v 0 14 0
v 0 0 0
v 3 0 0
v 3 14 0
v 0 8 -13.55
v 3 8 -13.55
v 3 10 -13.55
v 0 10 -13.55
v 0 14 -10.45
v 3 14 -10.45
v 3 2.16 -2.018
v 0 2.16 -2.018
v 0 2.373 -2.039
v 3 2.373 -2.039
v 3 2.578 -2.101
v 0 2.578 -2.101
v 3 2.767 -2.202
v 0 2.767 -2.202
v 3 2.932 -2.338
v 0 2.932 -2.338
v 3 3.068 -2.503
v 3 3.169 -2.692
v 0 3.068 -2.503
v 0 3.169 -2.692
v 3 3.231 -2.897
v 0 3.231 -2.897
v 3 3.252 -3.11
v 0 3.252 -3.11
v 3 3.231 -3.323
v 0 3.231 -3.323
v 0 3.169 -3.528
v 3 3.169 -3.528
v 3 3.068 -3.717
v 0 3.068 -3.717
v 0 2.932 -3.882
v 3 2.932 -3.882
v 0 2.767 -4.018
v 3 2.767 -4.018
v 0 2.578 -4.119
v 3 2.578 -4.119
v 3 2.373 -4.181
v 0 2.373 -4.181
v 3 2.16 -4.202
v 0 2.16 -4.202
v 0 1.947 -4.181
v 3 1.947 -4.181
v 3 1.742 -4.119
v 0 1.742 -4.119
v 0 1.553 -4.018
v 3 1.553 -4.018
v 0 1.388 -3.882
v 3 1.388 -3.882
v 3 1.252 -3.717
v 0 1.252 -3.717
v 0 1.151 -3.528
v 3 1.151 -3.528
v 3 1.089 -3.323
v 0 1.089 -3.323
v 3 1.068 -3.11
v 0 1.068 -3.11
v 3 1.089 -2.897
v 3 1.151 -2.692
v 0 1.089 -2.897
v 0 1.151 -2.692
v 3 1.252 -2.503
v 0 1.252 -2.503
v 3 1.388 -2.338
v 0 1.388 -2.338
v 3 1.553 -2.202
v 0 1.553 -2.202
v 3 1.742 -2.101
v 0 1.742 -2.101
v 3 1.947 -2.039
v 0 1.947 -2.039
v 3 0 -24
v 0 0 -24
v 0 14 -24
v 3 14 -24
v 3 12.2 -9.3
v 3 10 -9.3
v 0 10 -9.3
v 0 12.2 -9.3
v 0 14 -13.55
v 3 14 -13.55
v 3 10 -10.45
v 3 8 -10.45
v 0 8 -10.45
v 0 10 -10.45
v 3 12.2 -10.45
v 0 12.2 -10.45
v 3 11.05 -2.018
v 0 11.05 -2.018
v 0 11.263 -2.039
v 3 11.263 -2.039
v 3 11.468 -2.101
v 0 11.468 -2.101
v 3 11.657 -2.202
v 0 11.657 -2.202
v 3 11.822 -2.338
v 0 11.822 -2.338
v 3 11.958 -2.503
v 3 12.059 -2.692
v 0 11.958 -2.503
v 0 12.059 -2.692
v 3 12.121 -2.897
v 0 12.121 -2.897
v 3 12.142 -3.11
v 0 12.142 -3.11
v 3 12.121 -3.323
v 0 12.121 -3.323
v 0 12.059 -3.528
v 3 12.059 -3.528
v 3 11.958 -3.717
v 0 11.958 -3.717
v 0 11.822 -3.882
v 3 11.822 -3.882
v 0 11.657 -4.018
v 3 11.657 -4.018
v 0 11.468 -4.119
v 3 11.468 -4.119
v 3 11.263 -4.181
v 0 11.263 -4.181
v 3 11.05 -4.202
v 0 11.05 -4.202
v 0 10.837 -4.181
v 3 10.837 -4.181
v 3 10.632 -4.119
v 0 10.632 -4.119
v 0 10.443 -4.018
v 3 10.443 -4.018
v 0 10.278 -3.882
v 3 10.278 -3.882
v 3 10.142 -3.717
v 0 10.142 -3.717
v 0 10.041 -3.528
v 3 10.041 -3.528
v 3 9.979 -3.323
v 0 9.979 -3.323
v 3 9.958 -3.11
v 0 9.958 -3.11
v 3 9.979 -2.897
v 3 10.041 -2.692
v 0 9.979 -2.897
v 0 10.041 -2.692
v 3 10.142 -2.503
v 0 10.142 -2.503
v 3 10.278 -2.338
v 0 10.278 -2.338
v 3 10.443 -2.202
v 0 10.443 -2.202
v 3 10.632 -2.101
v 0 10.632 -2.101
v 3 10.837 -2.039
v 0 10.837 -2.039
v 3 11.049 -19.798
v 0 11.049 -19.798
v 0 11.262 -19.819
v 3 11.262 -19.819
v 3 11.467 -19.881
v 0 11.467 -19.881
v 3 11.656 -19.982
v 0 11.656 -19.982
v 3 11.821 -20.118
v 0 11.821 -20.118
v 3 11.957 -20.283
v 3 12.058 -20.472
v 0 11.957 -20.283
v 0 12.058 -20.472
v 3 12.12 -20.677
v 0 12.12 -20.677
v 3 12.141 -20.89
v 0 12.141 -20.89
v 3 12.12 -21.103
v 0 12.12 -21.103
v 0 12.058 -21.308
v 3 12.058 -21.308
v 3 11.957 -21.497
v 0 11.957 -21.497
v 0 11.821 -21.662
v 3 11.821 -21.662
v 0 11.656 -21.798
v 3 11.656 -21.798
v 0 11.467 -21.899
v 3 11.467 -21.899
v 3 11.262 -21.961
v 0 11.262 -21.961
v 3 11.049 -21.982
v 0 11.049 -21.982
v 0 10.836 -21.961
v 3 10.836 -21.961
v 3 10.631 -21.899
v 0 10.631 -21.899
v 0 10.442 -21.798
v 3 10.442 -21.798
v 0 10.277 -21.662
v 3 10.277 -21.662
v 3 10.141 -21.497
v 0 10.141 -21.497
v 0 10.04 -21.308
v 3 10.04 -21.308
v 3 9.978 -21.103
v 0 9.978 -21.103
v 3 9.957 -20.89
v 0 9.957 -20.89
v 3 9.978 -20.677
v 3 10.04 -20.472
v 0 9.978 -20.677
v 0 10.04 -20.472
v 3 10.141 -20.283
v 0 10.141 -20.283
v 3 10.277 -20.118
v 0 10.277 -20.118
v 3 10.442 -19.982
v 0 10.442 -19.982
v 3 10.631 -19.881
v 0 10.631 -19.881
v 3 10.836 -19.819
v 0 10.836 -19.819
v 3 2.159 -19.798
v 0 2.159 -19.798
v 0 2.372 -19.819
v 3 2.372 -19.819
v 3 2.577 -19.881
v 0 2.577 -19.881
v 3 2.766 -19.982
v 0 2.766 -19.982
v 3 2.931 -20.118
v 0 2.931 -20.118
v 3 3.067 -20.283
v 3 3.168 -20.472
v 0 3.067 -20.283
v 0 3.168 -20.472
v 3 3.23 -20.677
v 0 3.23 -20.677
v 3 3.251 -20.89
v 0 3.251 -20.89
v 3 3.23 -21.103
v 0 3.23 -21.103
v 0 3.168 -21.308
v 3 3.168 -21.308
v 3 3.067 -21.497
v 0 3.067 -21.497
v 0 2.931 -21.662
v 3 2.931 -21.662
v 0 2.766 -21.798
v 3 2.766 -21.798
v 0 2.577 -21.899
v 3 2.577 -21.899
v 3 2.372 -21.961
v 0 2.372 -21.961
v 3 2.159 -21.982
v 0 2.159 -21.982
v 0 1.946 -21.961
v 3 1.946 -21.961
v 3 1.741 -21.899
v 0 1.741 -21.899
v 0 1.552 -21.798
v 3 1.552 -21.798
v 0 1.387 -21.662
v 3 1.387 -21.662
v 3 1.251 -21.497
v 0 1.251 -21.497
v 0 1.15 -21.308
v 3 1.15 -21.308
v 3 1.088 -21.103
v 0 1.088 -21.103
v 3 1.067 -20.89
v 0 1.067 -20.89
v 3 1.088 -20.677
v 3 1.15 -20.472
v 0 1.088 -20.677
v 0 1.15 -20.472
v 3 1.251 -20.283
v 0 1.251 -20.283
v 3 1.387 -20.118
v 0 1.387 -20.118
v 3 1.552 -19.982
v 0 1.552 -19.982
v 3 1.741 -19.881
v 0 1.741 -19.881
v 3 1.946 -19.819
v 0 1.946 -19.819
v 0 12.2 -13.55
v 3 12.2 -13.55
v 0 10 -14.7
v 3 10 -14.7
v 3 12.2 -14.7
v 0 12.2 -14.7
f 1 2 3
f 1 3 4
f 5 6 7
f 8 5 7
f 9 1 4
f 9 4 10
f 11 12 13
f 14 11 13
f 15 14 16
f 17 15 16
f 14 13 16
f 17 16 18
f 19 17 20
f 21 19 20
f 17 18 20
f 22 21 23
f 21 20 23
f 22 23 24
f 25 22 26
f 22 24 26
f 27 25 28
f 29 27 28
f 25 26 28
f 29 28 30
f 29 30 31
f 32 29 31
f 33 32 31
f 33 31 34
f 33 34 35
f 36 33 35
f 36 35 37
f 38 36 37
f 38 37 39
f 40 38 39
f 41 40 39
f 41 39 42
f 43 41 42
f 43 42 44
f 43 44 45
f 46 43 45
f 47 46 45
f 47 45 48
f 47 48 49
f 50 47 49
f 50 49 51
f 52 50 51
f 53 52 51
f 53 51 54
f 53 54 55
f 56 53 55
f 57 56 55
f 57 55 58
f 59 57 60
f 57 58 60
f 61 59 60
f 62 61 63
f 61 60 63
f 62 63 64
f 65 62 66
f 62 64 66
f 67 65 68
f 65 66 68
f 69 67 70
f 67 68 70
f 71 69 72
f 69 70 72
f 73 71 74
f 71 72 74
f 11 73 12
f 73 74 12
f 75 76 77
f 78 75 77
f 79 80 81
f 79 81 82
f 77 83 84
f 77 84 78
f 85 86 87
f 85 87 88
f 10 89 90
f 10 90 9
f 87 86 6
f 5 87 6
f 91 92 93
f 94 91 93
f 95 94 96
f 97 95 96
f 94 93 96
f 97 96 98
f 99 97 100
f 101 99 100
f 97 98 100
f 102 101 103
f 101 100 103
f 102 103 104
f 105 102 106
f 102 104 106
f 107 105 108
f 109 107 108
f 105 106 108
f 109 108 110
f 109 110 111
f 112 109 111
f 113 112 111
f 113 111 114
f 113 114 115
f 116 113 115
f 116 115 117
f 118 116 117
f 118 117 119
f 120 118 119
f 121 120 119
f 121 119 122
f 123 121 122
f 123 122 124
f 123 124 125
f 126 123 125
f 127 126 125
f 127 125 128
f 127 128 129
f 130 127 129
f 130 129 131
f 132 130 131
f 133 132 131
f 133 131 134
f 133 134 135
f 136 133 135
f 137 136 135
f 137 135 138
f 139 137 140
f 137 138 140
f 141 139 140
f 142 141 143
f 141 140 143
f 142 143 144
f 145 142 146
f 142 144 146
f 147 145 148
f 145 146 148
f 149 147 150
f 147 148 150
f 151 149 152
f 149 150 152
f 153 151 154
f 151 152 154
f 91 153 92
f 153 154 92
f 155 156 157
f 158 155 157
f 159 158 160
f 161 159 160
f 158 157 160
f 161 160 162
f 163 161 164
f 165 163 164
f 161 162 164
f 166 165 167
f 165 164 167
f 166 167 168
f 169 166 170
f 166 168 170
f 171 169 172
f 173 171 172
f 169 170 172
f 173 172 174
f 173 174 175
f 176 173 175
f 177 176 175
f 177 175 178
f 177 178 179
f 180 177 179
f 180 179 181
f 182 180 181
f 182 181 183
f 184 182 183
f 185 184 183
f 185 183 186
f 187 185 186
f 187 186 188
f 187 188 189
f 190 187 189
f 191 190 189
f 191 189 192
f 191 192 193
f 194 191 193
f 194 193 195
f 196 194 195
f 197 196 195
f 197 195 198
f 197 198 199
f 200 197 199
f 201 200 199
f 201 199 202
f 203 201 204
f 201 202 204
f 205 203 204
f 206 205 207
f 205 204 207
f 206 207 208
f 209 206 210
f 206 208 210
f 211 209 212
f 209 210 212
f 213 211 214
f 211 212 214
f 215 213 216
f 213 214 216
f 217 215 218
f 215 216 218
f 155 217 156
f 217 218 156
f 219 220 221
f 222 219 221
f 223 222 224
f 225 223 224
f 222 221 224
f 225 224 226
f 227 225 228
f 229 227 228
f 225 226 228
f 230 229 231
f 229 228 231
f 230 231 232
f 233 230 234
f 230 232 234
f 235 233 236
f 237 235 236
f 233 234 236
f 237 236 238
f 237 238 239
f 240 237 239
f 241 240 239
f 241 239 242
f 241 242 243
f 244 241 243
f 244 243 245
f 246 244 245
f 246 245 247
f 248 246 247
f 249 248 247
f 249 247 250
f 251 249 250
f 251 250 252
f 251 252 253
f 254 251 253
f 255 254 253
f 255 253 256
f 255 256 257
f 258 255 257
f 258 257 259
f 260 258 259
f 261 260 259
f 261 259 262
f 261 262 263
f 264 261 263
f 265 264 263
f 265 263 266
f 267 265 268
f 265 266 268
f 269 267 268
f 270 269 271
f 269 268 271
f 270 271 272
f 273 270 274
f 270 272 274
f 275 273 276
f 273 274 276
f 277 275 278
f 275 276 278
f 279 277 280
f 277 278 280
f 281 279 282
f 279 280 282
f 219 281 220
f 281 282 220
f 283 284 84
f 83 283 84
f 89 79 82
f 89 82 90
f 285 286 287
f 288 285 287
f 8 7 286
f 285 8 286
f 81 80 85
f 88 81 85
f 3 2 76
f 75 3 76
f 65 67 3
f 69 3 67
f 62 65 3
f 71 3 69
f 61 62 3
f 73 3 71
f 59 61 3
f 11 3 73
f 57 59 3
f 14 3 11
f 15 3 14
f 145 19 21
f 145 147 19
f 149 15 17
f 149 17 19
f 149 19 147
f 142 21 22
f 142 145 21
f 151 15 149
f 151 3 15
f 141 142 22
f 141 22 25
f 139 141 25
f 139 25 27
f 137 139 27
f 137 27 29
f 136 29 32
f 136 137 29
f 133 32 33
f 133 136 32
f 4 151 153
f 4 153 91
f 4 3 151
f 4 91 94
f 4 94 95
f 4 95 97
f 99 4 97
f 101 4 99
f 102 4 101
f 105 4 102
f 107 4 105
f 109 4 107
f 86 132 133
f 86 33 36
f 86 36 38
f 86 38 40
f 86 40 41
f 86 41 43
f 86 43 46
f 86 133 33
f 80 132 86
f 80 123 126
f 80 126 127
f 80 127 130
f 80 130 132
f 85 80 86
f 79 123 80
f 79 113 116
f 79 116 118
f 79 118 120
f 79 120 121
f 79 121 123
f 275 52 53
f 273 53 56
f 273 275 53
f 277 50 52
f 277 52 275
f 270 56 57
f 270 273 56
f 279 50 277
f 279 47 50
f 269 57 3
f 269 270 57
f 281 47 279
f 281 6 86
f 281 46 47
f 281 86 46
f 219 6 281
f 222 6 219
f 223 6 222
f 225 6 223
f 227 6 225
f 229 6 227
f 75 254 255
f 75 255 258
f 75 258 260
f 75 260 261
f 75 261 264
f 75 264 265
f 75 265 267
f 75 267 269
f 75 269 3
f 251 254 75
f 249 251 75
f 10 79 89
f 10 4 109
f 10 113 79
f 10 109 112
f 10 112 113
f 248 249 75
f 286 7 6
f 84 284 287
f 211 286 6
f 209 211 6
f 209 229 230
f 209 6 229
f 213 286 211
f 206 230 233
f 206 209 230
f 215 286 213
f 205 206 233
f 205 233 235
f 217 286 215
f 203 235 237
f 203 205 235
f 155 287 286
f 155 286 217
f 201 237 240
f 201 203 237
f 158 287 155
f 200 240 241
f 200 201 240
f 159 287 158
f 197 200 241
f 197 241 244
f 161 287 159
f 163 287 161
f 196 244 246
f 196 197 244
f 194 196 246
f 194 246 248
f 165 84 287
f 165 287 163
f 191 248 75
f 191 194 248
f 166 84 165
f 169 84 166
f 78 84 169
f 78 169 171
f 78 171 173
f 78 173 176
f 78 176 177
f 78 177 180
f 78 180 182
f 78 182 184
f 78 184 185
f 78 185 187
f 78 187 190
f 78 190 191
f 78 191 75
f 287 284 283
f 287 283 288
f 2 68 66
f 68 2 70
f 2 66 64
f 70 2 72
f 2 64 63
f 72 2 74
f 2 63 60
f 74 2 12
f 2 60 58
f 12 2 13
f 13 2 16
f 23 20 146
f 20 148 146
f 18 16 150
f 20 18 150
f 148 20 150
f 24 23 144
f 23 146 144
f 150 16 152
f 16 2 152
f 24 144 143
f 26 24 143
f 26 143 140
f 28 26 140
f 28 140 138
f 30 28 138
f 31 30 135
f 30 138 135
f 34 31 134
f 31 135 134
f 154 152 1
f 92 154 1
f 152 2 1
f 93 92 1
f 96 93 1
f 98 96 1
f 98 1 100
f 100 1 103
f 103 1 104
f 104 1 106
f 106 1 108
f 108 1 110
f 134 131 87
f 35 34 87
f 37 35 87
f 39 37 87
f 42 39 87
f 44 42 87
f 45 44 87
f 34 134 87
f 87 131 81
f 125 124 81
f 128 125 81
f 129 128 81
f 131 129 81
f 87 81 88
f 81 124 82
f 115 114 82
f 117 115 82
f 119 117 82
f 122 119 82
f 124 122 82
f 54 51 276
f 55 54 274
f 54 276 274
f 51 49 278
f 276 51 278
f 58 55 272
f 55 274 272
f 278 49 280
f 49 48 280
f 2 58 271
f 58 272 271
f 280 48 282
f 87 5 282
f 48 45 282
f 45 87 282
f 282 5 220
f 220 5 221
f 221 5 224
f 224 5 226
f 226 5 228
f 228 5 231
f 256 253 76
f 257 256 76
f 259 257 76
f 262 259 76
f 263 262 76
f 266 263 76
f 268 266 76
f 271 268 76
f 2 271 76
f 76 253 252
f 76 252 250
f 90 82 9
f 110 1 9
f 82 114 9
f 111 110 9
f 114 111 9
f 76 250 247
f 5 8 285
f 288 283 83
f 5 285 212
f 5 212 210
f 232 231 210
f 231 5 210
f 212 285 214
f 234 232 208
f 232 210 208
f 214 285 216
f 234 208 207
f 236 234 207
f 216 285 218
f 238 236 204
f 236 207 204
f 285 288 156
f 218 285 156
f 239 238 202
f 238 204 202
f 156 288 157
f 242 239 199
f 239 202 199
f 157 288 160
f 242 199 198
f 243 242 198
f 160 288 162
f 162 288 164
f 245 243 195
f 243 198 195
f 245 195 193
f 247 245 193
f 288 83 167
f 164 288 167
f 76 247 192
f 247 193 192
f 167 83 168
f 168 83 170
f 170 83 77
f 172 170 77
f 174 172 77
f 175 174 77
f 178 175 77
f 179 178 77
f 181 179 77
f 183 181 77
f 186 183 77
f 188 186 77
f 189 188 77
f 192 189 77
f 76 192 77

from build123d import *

# Parameters (mm, degrees)
SKETCH1_W                   = 24
SKETCH1_H                   = 14
BOSS_EXTRUDE1_DEPTH         = 3
F_44_0_086_DIAMETER_HOLE3_D = 2.1844
SKETCH6_W                   = 3.1
SKETCH6_H                   = 6
SKETCH6_W_2                 = 5.4
SKETCH6_H_2                 = 2.2
CUT_EXTRUDE1_DEPTH          = 3


with BuildPart() as part:
    # Sketch1 → Boss-Extrude1 (new body)
    with BuildSketch(Plane(origin=(0, 0, 0), x_dir=(0, 0, -1), z_dir=(1, 0, 0))):
        with Locations((12, 7)):
            Rectangle(SKETCH1_W, SKETCH1_H)
    extrude(amount=BOSS_EXTRUDE1_DEPTH)

    # #44 (0.086) Diameter Hole3 (through all)
    with Locations(Plane(origin=(3, 0, 0), x_dir=(0, 0, -1), z_dir=(1, 0, 0))):
        with Locations((3.11, 11.05), (20.889999972, 11.049), (20.889999944, 2.159), (3.11, 2.16)):
            Hole(F_44_0_086_DIAMETER_HOLE3_D / 2)

    # Sketch6 → Cut-Extrude1 (cut)
    with BuildSketch(Plane(origin=(3, 0, 0), x_dir=(0, 0, -1), z_dir=(1, 0, 0))):
        with Locations((12, 11)):
            Rectangle(SKETCH6_W, SKETCH6_H)
        with Locations((12, 11.1)):
            Rectangle(SKETCH6_W_2, SKETCH6_H_2)
    extrude(amount=-CUT_EXTRUDE1_DEPTH, mode=Mode.SUBTRACT)


solid = part.part
